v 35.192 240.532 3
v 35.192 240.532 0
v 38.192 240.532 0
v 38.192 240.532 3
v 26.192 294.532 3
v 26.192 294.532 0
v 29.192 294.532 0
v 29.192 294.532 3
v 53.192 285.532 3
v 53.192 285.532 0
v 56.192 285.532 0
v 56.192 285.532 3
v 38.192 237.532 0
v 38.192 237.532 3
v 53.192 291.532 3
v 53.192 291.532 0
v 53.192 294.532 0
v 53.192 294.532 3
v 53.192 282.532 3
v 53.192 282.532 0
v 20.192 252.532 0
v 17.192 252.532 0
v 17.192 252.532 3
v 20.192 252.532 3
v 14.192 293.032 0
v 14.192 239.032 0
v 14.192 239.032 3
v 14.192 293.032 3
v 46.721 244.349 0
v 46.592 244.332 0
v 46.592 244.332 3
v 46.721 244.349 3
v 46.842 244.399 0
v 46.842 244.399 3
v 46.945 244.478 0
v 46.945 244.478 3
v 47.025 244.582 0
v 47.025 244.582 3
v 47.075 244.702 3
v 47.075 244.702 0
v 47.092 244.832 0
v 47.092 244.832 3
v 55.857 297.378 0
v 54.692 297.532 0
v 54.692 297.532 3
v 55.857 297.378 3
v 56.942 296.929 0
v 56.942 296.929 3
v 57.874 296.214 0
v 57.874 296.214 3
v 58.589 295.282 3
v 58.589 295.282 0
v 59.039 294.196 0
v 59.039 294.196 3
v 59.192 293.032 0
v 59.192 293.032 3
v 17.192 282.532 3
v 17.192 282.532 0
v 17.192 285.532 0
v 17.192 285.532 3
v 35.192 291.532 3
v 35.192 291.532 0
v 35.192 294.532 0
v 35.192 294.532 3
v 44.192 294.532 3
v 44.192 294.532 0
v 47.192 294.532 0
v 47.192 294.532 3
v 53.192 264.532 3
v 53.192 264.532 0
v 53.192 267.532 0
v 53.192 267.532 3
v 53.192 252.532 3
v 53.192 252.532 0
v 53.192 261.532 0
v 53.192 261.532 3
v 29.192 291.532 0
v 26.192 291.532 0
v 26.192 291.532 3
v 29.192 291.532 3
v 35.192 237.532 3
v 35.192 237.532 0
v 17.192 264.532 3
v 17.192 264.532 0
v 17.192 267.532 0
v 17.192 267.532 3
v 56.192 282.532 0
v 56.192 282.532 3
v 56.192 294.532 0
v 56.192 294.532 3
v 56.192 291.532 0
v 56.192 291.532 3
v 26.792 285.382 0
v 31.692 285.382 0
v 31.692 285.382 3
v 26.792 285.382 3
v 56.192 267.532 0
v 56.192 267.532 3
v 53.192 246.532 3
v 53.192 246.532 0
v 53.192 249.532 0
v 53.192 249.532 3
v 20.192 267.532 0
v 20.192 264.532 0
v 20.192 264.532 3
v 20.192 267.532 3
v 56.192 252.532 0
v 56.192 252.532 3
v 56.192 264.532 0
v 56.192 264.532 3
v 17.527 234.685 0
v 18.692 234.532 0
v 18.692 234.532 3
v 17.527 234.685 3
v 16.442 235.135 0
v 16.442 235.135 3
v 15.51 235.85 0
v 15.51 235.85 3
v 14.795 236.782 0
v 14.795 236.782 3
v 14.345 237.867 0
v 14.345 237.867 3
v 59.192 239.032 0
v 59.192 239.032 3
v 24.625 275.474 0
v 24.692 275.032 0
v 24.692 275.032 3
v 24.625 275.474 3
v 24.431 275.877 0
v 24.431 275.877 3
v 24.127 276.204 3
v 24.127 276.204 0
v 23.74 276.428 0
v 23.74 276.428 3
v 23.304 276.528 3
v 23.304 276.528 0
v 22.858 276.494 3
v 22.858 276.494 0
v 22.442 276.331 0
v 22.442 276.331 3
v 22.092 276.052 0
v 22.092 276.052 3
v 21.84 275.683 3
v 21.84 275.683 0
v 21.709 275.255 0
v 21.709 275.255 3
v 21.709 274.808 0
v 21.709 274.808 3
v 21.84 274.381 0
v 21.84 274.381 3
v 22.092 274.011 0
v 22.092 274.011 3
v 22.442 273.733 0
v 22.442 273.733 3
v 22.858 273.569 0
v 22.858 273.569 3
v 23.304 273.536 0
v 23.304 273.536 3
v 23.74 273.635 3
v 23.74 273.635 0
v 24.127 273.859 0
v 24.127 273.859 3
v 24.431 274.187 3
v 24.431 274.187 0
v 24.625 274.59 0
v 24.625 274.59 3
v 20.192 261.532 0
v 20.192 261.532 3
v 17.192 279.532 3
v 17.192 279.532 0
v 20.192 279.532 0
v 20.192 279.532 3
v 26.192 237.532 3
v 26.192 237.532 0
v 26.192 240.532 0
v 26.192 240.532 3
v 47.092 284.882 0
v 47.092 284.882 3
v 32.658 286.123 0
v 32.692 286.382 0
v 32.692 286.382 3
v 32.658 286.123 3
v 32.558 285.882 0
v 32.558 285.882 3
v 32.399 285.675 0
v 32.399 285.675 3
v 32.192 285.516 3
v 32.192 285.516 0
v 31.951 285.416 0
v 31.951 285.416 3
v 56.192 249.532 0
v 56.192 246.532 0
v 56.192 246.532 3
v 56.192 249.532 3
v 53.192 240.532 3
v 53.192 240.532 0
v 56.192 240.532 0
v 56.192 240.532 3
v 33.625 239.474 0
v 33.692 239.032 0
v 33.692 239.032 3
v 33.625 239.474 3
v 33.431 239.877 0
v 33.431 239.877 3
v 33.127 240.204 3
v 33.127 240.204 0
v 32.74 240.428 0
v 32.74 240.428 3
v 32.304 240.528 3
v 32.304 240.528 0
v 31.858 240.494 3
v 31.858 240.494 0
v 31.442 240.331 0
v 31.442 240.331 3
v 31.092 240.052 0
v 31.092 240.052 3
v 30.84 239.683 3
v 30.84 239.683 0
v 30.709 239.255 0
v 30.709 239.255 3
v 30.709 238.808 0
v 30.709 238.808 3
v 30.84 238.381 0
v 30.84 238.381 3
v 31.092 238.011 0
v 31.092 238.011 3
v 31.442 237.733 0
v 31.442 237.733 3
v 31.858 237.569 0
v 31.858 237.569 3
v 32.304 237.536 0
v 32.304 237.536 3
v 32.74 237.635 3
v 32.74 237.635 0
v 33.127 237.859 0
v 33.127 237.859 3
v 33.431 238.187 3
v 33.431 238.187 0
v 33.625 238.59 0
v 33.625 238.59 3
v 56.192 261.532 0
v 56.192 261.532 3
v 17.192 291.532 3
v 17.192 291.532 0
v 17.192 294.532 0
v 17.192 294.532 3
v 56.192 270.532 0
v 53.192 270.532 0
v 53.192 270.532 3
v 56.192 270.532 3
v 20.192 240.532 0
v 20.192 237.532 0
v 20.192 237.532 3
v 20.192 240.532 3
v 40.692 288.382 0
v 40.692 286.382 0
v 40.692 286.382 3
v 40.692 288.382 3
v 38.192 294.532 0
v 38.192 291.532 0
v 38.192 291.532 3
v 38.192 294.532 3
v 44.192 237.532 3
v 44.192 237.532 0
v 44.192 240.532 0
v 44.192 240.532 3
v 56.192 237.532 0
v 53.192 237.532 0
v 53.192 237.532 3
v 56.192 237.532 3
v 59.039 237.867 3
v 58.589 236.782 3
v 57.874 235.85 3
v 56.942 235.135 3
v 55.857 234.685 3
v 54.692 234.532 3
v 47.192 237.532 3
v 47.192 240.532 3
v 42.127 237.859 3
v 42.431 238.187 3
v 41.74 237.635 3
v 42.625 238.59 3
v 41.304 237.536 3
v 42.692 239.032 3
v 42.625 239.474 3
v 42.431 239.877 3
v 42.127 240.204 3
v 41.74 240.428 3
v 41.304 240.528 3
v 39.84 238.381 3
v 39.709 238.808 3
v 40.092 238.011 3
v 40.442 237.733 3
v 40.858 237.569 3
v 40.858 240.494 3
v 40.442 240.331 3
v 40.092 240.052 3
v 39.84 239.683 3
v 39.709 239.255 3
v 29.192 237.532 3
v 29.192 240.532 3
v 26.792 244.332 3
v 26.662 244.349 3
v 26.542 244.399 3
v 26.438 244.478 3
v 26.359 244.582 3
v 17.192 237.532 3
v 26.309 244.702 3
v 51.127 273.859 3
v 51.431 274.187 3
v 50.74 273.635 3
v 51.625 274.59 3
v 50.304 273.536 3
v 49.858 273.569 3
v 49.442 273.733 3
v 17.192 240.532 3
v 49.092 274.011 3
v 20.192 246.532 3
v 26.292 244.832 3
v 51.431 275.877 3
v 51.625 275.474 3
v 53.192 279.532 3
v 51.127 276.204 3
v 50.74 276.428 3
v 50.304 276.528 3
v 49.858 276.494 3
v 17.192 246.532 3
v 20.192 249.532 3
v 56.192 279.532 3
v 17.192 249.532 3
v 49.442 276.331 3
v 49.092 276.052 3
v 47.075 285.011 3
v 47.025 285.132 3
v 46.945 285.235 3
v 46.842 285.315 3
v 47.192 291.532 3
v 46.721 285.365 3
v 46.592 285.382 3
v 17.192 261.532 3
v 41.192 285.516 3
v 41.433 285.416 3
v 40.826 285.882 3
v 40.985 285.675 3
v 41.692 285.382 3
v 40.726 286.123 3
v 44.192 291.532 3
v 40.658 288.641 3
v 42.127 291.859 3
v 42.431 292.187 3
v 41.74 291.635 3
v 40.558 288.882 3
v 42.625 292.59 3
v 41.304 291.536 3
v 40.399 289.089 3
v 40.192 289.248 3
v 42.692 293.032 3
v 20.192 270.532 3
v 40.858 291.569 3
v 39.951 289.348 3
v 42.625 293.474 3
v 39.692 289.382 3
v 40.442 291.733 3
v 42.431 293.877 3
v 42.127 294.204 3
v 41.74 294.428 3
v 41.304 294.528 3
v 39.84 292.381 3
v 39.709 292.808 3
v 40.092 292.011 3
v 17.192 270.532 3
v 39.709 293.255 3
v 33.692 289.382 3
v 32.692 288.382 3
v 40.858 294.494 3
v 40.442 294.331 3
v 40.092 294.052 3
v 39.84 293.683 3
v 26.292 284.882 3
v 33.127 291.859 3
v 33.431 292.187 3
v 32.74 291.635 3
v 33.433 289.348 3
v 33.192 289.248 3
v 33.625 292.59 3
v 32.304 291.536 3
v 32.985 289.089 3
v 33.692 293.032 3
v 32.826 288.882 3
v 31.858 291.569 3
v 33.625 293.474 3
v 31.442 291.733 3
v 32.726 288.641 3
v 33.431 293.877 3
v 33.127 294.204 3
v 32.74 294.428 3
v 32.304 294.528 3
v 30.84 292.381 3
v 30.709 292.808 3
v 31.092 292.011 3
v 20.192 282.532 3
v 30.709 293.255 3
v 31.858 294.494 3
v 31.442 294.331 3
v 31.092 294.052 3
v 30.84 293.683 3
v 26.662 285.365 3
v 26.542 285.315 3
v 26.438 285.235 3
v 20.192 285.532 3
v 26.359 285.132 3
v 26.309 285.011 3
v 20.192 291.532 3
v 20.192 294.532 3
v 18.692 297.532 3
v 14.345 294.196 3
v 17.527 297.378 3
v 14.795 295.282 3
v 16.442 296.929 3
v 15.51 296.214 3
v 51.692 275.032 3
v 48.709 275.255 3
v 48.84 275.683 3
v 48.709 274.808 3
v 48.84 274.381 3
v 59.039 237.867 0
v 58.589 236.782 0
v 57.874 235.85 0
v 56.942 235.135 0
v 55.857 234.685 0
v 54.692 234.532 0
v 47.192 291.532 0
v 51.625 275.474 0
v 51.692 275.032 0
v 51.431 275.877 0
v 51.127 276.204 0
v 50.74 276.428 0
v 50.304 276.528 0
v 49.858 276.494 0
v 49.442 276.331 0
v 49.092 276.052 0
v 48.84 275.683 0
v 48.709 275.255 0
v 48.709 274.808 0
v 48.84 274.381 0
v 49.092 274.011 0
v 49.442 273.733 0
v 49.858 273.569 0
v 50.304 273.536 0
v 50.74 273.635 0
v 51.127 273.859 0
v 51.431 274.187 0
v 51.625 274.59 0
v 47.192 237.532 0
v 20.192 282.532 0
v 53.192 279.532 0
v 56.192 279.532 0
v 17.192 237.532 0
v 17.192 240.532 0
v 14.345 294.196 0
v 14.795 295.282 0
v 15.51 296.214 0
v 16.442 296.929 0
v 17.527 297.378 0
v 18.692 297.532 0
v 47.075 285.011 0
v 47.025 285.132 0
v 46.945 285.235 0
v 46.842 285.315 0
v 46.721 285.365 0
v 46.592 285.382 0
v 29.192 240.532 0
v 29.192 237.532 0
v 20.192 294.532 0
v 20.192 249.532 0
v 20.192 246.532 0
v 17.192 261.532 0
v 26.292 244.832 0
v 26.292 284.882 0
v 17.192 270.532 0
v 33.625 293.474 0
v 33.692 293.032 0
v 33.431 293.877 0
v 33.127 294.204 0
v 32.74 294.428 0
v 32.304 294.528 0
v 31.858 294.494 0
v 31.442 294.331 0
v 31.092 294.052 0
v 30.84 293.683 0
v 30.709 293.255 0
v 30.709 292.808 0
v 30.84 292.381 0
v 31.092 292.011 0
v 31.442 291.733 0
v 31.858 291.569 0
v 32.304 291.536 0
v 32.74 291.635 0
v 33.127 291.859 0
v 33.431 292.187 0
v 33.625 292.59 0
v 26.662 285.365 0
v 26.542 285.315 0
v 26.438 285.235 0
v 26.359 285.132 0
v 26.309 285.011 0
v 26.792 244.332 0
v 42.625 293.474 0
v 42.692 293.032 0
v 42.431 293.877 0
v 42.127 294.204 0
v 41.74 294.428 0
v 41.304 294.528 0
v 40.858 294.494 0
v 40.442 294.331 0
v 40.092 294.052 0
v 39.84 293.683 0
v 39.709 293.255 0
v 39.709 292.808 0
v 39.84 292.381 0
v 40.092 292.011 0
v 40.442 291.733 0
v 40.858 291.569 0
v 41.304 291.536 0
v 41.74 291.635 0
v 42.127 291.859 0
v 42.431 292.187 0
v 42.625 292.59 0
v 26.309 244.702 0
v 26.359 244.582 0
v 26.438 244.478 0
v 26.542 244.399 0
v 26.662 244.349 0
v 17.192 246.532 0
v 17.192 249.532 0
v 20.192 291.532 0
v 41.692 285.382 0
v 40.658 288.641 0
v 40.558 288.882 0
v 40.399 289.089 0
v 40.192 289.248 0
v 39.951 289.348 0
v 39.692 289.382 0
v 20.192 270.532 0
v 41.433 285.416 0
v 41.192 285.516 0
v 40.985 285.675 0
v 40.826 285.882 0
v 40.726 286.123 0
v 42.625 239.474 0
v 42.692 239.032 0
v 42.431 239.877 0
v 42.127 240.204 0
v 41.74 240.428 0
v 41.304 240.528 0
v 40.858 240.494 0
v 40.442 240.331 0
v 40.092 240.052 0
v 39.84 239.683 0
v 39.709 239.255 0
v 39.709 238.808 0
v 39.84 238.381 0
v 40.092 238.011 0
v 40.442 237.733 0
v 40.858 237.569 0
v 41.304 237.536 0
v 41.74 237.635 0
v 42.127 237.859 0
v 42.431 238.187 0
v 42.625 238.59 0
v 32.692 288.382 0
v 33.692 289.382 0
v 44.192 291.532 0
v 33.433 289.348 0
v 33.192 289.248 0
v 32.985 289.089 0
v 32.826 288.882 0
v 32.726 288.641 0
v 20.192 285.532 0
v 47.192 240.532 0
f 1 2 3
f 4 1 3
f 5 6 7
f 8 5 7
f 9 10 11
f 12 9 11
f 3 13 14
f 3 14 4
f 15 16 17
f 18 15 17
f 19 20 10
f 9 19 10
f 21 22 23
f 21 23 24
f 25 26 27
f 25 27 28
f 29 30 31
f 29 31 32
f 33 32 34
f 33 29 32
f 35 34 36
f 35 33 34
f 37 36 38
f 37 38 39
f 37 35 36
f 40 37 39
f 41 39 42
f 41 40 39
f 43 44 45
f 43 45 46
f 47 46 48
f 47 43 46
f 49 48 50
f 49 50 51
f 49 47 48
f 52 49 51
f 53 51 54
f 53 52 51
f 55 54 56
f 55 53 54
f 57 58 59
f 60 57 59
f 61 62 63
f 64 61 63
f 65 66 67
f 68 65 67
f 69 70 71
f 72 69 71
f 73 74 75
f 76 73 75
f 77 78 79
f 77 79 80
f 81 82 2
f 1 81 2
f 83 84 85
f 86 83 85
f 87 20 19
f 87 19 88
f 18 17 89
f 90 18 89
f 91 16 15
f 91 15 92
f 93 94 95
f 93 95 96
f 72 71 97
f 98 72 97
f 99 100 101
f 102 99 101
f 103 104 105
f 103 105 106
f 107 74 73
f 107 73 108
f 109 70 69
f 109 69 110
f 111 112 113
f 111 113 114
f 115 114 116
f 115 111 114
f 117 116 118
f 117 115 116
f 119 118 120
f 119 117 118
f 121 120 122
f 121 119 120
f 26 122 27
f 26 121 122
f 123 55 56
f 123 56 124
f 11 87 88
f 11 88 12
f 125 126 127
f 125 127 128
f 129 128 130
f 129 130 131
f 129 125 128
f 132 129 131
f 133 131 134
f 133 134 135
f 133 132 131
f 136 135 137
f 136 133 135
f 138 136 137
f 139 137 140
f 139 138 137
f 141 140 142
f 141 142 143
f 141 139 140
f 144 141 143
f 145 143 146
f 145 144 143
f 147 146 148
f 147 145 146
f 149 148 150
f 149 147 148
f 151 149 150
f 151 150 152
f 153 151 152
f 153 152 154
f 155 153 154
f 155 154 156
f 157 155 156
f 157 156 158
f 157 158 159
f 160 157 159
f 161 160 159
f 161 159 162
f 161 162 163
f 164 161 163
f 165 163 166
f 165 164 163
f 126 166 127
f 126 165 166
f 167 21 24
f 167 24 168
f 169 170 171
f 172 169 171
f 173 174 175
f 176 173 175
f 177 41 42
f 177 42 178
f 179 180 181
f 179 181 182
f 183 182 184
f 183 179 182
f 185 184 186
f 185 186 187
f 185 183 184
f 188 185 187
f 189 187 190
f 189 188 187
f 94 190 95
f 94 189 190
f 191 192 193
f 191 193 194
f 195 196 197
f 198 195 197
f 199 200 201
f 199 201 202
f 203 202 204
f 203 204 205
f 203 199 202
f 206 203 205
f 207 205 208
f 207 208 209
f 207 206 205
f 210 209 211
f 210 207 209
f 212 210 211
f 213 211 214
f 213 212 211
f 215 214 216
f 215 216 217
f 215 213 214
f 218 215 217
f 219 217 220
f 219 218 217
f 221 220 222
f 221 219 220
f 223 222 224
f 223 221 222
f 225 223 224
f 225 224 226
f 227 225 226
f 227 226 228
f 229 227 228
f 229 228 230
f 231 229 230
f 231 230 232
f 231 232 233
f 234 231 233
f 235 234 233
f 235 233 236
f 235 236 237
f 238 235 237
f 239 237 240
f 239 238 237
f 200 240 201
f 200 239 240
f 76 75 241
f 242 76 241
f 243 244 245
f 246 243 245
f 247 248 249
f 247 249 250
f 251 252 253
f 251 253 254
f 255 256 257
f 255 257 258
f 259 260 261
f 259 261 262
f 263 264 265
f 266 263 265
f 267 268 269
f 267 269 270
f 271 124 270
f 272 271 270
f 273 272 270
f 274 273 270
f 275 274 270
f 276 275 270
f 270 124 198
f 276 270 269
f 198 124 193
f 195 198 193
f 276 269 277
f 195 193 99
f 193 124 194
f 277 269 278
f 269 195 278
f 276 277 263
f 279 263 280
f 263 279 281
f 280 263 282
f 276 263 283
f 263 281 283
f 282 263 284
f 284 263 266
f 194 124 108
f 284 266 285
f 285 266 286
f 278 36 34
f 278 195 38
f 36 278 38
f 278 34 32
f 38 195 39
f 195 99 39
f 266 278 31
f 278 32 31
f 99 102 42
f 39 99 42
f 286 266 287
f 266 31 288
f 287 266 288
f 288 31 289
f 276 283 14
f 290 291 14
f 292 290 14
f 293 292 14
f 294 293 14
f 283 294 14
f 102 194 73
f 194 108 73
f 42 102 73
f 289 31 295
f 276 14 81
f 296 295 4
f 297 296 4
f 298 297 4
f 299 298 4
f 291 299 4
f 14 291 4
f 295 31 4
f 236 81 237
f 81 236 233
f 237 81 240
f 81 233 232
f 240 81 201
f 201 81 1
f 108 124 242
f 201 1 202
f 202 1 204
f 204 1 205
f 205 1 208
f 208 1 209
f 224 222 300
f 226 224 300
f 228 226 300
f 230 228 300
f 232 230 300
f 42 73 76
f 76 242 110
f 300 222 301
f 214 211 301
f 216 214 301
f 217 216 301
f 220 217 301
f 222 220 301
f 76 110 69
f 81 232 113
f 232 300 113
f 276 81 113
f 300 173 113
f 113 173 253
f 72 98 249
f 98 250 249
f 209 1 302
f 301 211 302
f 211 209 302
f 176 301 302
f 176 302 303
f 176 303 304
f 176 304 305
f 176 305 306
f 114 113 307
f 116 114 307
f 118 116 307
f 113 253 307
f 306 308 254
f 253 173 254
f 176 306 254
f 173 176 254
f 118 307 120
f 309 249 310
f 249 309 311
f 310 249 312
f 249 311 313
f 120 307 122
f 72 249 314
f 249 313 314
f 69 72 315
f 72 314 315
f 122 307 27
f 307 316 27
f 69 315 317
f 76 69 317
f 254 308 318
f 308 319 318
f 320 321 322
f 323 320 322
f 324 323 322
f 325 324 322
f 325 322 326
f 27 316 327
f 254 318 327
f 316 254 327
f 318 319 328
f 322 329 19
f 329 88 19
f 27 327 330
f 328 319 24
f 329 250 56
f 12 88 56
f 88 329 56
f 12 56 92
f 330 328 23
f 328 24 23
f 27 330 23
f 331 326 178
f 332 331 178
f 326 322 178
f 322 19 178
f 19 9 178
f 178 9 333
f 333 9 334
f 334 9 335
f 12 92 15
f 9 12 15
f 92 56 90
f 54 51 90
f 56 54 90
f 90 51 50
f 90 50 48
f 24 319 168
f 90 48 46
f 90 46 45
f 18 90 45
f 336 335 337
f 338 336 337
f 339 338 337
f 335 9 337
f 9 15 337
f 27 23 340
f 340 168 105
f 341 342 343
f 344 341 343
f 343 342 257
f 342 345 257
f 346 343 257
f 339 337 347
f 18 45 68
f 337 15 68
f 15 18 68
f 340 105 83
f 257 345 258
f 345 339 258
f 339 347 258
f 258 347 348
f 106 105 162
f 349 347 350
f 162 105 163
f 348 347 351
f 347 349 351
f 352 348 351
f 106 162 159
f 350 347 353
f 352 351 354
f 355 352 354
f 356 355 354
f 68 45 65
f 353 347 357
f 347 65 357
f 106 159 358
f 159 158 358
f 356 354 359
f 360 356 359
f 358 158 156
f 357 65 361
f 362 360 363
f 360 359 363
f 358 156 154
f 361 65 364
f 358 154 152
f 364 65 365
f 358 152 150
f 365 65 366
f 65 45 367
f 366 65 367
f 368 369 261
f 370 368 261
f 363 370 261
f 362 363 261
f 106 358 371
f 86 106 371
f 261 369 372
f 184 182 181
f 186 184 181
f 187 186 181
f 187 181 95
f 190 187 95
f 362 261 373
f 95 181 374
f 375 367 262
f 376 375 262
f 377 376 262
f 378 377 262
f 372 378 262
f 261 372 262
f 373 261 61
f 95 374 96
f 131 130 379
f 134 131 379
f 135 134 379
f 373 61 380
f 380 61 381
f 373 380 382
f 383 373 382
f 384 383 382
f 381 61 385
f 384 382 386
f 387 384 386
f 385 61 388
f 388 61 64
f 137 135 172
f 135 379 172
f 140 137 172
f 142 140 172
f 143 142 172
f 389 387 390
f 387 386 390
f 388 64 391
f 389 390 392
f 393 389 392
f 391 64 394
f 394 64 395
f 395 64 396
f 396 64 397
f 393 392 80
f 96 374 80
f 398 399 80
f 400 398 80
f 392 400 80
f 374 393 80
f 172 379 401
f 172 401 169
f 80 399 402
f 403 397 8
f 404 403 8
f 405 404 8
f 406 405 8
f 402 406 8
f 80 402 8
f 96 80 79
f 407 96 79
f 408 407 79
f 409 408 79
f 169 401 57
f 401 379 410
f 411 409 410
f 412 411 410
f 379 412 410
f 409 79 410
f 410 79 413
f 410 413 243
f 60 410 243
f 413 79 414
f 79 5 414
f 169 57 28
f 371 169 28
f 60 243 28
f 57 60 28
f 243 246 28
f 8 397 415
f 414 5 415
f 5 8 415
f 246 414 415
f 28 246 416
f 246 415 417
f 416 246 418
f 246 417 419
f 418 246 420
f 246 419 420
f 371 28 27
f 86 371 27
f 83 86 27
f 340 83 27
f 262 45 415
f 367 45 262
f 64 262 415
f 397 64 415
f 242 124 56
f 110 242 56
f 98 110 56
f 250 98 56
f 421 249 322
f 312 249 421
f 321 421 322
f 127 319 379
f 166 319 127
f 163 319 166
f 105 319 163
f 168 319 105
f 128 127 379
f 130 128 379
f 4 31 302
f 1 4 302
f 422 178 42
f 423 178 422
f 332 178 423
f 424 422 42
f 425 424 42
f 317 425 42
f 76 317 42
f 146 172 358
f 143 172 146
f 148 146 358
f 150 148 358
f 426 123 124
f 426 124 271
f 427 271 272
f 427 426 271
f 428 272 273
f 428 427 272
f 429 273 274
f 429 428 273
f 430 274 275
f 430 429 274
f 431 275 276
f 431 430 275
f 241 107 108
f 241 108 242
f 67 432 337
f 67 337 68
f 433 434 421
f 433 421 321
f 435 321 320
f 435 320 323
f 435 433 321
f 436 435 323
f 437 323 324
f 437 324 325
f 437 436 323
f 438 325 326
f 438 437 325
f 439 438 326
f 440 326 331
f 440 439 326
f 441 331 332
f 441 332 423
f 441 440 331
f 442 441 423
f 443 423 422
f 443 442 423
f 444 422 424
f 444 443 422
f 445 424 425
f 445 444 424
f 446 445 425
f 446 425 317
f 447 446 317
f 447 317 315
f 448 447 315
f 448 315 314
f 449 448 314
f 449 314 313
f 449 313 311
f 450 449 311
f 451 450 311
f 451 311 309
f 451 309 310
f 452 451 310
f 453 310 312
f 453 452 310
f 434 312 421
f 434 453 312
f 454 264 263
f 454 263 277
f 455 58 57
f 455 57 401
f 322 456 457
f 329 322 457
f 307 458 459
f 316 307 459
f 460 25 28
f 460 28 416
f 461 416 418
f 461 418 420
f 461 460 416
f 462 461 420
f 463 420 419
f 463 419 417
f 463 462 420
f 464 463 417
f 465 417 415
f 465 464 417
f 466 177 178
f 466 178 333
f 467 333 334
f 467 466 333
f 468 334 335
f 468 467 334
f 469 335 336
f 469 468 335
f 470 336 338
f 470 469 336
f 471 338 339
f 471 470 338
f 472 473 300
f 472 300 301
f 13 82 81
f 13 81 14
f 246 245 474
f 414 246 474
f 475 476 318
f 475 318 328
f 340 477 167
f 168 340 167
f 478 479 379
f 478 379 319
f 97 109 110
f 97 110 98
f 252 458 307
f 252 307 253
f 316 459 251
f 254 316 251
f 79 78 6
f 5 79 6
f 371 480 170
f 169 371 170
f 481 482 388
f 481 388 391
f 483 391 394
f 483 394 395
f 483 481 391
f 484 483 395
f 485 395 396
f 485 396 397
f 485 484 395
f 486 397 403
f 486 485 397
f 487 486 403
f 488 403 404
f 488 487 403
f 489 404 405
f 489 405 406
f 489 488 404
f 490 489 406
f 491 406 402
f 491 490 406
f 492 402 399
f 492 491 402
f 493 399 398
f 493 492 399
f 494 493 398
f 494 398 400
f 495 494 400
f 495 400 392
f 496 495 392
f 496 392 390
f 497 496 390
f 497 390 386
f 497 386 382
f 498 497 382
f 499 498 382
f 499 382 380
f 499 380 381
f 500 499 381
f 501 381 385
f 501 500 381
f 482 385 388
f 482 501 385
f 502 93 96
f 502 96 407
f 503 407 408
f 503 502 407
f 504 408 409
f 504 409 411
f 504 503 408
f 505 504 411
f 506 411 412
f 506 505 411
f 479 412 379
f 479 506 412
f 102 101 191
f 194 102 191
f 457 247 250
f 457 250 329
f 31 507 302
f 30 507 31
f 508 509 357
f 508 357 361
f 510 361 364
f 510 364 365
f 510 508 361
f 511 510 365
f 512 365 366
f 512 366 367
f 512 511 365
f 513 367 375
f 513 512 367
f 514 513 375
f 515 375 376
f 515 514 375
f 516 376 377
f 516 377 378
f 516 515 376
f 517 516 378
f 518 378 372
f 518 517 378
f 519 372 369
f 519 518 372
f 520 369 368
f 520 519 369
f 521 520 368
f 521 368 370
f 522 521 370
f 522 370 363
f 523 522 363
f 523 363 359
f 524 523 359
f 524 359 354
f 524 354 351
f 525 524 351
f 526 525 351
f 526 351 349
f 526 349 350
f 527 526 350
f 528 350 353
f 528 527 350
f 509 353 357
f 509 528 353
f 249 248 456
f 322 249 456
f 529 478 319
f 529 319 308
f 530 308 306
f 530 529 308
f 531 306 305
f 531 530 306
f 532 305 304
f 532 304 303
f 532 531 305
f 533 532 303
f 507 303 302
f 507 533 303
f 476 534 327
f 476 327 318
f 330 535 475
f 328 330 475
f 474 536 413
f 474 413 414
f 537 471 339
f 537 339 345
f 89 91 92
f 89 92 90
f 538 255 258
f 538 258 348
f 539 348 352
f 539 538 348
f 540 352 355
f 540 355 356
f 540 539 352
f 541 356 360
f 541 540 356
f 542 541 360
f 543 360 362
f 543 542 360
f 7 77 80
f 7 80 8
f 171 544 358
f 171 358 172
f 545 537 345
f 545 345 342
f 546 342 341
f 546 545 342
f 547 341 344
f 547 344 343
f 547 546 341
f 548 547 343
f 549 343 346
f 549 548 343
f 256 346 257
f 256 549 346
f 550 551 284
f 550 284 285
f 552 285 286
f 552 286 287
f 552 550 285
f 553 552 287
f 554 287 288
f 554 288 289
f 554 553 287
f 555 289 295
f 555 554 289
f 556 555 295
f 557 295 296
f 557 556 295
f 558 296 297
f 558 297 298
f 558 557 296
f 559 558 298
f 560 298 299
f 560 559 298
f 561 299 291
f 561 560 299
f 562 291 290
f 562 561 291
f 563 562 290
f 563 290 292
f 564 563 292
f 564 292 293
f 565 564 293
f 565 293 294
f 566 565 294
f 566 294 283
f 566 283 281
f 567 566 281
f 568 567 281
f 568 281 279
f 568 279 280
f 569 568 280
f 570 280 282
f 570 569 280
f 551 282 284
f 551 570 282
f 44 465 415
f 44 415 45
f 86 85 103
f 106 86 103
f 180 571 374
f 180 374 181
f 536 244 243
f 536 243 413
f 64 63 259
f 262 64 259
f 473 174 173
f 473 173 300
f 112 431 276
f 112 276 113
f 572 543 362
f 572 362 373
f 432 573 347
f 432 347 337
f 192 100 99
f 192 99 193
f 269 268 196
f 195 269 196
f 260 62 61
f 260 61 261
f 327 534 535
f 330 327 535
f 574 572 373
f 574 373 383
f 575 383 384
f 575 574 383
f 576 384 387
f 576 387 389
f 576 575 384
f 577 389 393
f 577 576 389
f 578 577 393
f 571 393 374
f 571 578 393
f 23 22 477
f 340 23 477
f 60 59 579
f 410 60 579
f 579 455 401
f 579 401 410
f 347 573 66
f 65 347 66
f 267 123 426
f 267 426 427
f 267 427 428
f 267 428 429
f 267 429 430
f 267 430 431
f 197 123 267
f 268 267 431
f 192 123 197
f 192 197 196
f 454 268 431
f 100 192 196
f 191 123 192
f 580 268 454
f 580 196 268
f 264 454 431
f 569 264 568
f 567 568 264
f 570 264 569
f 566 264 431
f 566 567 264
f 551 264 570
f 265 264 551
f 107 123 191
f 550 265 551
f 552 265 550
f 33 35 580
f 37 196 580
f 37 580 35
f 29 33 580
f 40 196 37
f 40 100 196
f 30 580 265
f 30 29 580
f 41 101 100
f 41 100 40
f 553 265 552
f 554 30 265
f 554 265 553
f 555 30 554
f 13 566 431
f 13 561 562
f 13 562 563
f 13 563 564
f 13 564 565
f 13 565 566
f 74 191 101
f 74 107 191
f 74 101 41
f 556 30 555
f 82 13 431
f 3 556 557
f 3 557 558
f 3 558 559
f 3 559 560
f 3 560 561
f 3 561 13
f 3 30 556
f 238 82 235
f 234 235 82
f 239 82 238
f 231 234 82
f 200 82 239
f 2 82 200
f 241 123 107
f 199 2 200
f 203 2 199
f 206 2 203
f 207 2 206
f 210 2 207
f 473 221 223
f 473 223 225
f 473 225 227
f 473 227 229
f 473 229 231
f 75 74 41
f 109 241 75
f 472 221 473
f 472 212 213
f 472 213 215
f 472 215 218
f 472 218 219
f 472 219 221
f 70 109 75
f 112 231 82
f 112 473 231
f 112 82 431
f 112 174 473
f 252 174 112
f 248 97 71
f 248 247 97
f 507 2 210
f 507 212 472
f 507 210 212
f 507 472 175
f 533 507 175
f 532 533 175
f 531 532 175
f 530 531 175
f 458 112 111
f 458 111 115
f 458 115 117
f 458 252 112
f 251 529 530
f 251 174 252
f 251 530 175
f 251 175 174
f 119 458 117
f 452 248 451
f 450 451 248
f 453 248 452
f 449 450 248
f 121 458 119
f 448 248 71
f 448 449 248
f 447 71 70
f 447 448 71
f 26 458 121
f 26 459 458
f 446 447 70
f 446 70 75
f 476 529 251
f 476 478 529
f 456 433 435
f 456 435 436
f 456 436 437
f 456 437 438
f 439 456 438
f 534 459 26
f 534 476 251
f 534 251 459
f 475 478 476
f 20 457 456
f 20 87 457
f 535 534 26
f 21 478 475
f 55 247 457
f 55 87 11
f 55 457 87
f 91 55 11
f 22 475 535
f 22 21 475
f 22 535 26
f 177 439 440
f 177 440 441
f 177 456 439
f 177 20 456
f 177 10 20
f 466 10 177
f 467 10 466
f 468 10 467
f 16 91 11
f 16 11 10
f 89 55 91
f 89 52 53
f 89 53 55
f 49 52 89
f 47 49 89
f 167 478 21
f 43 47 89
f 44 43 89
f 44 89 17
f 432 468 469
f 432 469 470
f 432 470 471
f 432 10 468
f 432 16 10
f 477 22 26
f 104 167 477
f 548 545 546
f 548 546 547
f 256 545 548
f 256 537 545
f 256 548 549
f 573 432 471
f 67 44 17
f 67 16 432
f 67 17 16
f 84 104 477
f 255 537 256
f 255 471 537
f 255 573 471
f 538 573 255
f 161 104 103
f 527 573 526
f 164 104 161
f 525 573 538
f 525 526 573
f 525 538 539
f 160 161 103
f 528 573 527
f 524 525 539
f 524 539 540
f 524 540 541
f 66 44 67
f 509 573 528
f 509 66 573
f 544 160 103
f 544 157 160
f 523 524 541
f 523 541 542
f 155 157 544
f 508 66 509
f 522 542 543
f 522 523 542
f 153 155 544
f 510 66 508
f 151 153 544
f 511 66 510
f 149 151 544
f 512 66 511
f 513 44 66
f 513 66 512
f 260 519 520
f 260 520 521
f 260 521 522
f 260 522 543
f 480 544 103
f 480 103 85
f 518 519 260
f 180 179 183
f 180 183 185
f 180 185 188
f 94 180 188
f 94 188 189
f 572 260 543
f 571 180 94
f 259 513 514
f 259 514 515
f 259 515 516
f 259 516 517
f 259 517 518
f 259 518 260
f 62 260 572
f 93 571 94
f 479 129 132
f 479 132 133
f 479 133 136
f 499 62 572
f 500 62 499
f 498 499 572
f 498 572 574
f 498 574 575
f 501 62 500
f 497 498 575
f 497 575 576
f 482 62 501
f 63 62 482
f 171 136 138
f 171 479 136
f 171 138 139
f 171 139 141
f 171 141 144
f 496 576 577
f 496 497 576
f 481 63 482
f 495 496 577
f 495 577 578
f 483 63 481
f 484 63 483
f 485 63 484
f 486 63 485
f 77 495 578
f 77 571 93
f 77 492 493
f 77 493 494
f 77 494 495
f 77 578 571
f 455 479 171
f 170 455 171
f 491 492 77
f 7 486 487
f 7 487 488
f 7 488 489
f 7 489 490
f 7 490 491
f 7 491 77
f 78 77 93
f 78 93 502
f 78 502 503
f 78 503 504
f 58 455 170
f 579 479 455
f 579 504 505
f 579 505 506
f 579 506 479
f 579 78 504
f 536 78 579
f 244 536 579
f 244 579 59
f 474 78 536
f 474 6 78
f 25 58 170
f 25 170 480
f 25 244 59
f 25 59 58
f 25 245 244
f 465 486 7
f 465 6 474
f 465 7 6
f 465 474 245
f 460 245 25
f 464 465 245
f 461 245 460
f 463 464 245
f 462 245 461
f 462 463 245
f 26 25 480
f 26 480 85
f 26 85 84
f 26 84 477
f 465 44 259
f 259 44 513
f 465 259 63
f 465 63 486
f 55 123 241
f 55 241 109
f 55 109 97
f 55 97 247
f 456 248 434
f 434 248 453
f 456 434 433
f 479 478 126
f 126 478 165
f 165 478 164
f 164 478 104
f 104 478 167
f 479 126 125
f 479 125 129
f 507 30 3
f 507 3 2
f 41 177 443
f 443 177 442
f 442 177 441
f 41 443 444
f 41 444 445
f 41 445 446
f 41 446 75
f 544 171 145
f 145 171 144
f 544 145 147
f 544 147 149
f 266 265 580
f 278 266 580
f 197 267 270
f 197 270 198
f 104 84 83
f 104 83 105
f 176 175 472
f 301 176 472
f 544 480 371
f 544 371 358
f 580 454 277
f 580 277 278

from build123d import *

# Parameters (mm, degrees)
MODEL_R                 = 1.5
MODEL_W                 = 3
MODEL_H                 = 3
MODEL_H_2               = 9
SALIENTE_EXTRUIR1_DEPTH = 3


with BuildPart() as part:
    # Model → Saliente-Extruir1 (new body)
    with BuildSketch(Plane.XY):
        with BuildLine():
            Line((14.191843711, 239.031739215), (14.191843711, 293.031739215))
            ThreePointArc((14.191843711, 293.031739215), (15.509863195, 296.213719731), (18.691843711, 297.531739215))
            Line((18.691843711, 297.531739215), (54.691843711, 297.531739215))
            ThreePointArc((54.691843711, 297.531739215), (57.873824226, 296.213719731), (59.191843711, 293.031739215))
            Line((59.191843711, 293.031739215), (59.191843711, 239.031739215))
            ThreePointArc((59.191843711, 239.031739215), (57.873824226, 235.8497587), (54.691843711, 234.531739215))
            Line((54.691843711, 234.531739215), (18.691843711, 234.531739215))
            ThreePointArc((18.691843711, 234.531739215), (15.509863195, 235.8497587), (14.191843711, 239.031739215))
        make_face()
        with Locations((32.191843711, 239.031739215)):
            Circle(MODEL_R, mode=Mode.SUBTRACT)
        with Locations((41.191843711, 239.031739215)):
            Circle(MODEL_R, mode=Mode.SUBTRACT)
        with Locations((32.191843711, 293.031739215)):
            Circle(MODEL_R, mode=Mode.SUBTRACT)
        with Locations((41.191843711, 293.031739215)):
            Circle(MODEL_R, mode=Mode.SUBTRACT)
        with Locations((50.191843711, 275.031739215)):
            Circle(MODEL_R, mode=Mode.SUBTRACT)
        with Locations((23.191843711, 275.031739215)):
            Circle(MODEL_R, mode=Mode.SUBTRACT)
        with Locations((18.691843711, 239.031739215)):
            Rectangle(MODEL_W, MODEL_H, mode=Mode.SUBTRACT)
        with Locations((18.691843711, 248.031739215)):
            Rectangle(MODEL_W, MODEL_H, mode=Mode.SUBTRACT)
        with Locations((18.691843711, 293.031739215)):
            Rectangle(MODEL_W, MODEL_H, mode=Mode.SUBTRACT)
        with Locations((54.691843711, 239.031739215)):
            Rectangle(MODEL_W, MODEL_H, mode=Mode.SUBTRACT)
        with Locations((54.691843711, 248.031739215)):
            Rectangle(MODEL_W, MODEL_H, mode=Mode.SUBTRACT)
        with Locations((54.691843711, 293.031739215)):
            Rectangle(MODEL_W, MODEL_H, mode=Mode.SUBTRACT)
        with Locations((45.691843711, 239.031739215)):
            Rectangle(MODEL_W, MODEL_H, mode=Mode.SUBTRACT)
        with Locations((45.691843711, 293.031739215)):
            Rectangle(MODEL_W, MODEL_H, mode=Mode.SUBTRACT)
        with Locations((18.691843711, 266.031739215)):
            Rectangle(MODEL_W, MODEL_H, mode=Mode.SUBTRACT)
        with Locations((18.691843711, 284.031739215)):
            Rectangle(MODEL_W, MODEL_H, mode=Mode.SUBTRACT)
        with Locations((54.691843711, 266.031739215)):
            Rectangle(MODEL_W, MODEL_H, mode=Mode.SUBTRACT)
        with Locations((54.691843711, 284.031739215)):
            Rectangle(MODEL_W, MODEL_H, mode=Mode.SUBTRACT)
        with Locations((36.691843711, 239.031739215)):
            Rectangle(MODEL_W, MODEL_H, mode=Mode.SUBTRACT)
        with Locations((36.691843711, 293.031739215)):
            Rectangle(MODEL_W, MODEL_H, mode=Mode.SUBTRACT)
        with Locations((27.691843711, 239.031739215)):
            Rectangle(MODEL_W, MODEL_H, mode=Mode.SUBTRACT)
        with Locations((27.691843711, 293.031739215)):
            Rectangle(MODEL_W, MODEL_H, mode=Mode.SUBTRACT)
        with Locations((18.691843711, 257.031739215)):
            Rectangle(MODEL_W, MODEL_H_2, mode=Mode.SUBTRACT)
        with Locations((54.691843711, 257.031739215)):
            Rectangle(MODEL_W, MODEL_H_2, mode=Mode.SUBTRACT)
        with Locations((18.691843711, 275.031739215)):
            Rectangle(MODEL_W, MODEL_H_2, mode=Mode.SUBTRACT)
        with Locations((54.691843711, 275.031739215)):
            Rectangle(MODEL_W, MODEL_H_2, mode=Mode.SUBTRACT)
        with BuildLine():
            Line((26.291843711, 284.881739215), (26.291843711, 244.831739215))
            ThreePointArc((26.291843711, 244.831739215), (26.43829032, 244.478185825), (26.791843711, 244.331739215))
            Line((26.791843711, 244.331739215), (46.591843711, 244.331739215))
            ThreePointArc((46.591843711, 244.331739215), (46.945397101, 244.478185825), (47.091843711, 244.831739215))
            Line((47.091843711, 244.831739215), (47.091843711, 284.881739215))
            ThreePointArc((47.091843711, 284.881739215), (46.945397101, 285.235292606), (46.591843711, 285.381739215))
            Line((46.591843711, 285.381739215), (41.691843711, 285.381739215))
            ThreePointArc((41.691843711, 285.381739215), (40.98473693, 285.674632434), (40.691843711, 286.381739215))
            Line((40.691843711, 286.381739215), (40.691843711, 288.381739215))
            ThreePointArc((40.691843711, 288.381739215), (40.398950492, 289.088845997), (39.691843711, 289.381739215))
            Line((39.691843711, 289.381739215), (33.691843711, 289.381739215))
            ThreePointArc((33.691843711, 289.381739215), (32.98473693, 289.088845997), (32.691843711, 288.381739215))
            Line((32.691843711, 288.381739215), (32.691843711, 286.381739215))
            ThreePointArc((32.691843711, 286.381739215), (32.398950492, 285.674632434), (31.691843711, 285.381739215))
            Line((31.691843711, 285.381739215), (26.791843711, 285.381739215))
            ThreePointArc((26.791843711, 285.381739215), (26.43829032, 285.235292606), (26.291843711, 284.881739215))
        make_face(mode=Mode.SUBTRACT)
    extrude(amount=SALIENTE_EXTRUIR1_DEPTH)


solid = part.part
